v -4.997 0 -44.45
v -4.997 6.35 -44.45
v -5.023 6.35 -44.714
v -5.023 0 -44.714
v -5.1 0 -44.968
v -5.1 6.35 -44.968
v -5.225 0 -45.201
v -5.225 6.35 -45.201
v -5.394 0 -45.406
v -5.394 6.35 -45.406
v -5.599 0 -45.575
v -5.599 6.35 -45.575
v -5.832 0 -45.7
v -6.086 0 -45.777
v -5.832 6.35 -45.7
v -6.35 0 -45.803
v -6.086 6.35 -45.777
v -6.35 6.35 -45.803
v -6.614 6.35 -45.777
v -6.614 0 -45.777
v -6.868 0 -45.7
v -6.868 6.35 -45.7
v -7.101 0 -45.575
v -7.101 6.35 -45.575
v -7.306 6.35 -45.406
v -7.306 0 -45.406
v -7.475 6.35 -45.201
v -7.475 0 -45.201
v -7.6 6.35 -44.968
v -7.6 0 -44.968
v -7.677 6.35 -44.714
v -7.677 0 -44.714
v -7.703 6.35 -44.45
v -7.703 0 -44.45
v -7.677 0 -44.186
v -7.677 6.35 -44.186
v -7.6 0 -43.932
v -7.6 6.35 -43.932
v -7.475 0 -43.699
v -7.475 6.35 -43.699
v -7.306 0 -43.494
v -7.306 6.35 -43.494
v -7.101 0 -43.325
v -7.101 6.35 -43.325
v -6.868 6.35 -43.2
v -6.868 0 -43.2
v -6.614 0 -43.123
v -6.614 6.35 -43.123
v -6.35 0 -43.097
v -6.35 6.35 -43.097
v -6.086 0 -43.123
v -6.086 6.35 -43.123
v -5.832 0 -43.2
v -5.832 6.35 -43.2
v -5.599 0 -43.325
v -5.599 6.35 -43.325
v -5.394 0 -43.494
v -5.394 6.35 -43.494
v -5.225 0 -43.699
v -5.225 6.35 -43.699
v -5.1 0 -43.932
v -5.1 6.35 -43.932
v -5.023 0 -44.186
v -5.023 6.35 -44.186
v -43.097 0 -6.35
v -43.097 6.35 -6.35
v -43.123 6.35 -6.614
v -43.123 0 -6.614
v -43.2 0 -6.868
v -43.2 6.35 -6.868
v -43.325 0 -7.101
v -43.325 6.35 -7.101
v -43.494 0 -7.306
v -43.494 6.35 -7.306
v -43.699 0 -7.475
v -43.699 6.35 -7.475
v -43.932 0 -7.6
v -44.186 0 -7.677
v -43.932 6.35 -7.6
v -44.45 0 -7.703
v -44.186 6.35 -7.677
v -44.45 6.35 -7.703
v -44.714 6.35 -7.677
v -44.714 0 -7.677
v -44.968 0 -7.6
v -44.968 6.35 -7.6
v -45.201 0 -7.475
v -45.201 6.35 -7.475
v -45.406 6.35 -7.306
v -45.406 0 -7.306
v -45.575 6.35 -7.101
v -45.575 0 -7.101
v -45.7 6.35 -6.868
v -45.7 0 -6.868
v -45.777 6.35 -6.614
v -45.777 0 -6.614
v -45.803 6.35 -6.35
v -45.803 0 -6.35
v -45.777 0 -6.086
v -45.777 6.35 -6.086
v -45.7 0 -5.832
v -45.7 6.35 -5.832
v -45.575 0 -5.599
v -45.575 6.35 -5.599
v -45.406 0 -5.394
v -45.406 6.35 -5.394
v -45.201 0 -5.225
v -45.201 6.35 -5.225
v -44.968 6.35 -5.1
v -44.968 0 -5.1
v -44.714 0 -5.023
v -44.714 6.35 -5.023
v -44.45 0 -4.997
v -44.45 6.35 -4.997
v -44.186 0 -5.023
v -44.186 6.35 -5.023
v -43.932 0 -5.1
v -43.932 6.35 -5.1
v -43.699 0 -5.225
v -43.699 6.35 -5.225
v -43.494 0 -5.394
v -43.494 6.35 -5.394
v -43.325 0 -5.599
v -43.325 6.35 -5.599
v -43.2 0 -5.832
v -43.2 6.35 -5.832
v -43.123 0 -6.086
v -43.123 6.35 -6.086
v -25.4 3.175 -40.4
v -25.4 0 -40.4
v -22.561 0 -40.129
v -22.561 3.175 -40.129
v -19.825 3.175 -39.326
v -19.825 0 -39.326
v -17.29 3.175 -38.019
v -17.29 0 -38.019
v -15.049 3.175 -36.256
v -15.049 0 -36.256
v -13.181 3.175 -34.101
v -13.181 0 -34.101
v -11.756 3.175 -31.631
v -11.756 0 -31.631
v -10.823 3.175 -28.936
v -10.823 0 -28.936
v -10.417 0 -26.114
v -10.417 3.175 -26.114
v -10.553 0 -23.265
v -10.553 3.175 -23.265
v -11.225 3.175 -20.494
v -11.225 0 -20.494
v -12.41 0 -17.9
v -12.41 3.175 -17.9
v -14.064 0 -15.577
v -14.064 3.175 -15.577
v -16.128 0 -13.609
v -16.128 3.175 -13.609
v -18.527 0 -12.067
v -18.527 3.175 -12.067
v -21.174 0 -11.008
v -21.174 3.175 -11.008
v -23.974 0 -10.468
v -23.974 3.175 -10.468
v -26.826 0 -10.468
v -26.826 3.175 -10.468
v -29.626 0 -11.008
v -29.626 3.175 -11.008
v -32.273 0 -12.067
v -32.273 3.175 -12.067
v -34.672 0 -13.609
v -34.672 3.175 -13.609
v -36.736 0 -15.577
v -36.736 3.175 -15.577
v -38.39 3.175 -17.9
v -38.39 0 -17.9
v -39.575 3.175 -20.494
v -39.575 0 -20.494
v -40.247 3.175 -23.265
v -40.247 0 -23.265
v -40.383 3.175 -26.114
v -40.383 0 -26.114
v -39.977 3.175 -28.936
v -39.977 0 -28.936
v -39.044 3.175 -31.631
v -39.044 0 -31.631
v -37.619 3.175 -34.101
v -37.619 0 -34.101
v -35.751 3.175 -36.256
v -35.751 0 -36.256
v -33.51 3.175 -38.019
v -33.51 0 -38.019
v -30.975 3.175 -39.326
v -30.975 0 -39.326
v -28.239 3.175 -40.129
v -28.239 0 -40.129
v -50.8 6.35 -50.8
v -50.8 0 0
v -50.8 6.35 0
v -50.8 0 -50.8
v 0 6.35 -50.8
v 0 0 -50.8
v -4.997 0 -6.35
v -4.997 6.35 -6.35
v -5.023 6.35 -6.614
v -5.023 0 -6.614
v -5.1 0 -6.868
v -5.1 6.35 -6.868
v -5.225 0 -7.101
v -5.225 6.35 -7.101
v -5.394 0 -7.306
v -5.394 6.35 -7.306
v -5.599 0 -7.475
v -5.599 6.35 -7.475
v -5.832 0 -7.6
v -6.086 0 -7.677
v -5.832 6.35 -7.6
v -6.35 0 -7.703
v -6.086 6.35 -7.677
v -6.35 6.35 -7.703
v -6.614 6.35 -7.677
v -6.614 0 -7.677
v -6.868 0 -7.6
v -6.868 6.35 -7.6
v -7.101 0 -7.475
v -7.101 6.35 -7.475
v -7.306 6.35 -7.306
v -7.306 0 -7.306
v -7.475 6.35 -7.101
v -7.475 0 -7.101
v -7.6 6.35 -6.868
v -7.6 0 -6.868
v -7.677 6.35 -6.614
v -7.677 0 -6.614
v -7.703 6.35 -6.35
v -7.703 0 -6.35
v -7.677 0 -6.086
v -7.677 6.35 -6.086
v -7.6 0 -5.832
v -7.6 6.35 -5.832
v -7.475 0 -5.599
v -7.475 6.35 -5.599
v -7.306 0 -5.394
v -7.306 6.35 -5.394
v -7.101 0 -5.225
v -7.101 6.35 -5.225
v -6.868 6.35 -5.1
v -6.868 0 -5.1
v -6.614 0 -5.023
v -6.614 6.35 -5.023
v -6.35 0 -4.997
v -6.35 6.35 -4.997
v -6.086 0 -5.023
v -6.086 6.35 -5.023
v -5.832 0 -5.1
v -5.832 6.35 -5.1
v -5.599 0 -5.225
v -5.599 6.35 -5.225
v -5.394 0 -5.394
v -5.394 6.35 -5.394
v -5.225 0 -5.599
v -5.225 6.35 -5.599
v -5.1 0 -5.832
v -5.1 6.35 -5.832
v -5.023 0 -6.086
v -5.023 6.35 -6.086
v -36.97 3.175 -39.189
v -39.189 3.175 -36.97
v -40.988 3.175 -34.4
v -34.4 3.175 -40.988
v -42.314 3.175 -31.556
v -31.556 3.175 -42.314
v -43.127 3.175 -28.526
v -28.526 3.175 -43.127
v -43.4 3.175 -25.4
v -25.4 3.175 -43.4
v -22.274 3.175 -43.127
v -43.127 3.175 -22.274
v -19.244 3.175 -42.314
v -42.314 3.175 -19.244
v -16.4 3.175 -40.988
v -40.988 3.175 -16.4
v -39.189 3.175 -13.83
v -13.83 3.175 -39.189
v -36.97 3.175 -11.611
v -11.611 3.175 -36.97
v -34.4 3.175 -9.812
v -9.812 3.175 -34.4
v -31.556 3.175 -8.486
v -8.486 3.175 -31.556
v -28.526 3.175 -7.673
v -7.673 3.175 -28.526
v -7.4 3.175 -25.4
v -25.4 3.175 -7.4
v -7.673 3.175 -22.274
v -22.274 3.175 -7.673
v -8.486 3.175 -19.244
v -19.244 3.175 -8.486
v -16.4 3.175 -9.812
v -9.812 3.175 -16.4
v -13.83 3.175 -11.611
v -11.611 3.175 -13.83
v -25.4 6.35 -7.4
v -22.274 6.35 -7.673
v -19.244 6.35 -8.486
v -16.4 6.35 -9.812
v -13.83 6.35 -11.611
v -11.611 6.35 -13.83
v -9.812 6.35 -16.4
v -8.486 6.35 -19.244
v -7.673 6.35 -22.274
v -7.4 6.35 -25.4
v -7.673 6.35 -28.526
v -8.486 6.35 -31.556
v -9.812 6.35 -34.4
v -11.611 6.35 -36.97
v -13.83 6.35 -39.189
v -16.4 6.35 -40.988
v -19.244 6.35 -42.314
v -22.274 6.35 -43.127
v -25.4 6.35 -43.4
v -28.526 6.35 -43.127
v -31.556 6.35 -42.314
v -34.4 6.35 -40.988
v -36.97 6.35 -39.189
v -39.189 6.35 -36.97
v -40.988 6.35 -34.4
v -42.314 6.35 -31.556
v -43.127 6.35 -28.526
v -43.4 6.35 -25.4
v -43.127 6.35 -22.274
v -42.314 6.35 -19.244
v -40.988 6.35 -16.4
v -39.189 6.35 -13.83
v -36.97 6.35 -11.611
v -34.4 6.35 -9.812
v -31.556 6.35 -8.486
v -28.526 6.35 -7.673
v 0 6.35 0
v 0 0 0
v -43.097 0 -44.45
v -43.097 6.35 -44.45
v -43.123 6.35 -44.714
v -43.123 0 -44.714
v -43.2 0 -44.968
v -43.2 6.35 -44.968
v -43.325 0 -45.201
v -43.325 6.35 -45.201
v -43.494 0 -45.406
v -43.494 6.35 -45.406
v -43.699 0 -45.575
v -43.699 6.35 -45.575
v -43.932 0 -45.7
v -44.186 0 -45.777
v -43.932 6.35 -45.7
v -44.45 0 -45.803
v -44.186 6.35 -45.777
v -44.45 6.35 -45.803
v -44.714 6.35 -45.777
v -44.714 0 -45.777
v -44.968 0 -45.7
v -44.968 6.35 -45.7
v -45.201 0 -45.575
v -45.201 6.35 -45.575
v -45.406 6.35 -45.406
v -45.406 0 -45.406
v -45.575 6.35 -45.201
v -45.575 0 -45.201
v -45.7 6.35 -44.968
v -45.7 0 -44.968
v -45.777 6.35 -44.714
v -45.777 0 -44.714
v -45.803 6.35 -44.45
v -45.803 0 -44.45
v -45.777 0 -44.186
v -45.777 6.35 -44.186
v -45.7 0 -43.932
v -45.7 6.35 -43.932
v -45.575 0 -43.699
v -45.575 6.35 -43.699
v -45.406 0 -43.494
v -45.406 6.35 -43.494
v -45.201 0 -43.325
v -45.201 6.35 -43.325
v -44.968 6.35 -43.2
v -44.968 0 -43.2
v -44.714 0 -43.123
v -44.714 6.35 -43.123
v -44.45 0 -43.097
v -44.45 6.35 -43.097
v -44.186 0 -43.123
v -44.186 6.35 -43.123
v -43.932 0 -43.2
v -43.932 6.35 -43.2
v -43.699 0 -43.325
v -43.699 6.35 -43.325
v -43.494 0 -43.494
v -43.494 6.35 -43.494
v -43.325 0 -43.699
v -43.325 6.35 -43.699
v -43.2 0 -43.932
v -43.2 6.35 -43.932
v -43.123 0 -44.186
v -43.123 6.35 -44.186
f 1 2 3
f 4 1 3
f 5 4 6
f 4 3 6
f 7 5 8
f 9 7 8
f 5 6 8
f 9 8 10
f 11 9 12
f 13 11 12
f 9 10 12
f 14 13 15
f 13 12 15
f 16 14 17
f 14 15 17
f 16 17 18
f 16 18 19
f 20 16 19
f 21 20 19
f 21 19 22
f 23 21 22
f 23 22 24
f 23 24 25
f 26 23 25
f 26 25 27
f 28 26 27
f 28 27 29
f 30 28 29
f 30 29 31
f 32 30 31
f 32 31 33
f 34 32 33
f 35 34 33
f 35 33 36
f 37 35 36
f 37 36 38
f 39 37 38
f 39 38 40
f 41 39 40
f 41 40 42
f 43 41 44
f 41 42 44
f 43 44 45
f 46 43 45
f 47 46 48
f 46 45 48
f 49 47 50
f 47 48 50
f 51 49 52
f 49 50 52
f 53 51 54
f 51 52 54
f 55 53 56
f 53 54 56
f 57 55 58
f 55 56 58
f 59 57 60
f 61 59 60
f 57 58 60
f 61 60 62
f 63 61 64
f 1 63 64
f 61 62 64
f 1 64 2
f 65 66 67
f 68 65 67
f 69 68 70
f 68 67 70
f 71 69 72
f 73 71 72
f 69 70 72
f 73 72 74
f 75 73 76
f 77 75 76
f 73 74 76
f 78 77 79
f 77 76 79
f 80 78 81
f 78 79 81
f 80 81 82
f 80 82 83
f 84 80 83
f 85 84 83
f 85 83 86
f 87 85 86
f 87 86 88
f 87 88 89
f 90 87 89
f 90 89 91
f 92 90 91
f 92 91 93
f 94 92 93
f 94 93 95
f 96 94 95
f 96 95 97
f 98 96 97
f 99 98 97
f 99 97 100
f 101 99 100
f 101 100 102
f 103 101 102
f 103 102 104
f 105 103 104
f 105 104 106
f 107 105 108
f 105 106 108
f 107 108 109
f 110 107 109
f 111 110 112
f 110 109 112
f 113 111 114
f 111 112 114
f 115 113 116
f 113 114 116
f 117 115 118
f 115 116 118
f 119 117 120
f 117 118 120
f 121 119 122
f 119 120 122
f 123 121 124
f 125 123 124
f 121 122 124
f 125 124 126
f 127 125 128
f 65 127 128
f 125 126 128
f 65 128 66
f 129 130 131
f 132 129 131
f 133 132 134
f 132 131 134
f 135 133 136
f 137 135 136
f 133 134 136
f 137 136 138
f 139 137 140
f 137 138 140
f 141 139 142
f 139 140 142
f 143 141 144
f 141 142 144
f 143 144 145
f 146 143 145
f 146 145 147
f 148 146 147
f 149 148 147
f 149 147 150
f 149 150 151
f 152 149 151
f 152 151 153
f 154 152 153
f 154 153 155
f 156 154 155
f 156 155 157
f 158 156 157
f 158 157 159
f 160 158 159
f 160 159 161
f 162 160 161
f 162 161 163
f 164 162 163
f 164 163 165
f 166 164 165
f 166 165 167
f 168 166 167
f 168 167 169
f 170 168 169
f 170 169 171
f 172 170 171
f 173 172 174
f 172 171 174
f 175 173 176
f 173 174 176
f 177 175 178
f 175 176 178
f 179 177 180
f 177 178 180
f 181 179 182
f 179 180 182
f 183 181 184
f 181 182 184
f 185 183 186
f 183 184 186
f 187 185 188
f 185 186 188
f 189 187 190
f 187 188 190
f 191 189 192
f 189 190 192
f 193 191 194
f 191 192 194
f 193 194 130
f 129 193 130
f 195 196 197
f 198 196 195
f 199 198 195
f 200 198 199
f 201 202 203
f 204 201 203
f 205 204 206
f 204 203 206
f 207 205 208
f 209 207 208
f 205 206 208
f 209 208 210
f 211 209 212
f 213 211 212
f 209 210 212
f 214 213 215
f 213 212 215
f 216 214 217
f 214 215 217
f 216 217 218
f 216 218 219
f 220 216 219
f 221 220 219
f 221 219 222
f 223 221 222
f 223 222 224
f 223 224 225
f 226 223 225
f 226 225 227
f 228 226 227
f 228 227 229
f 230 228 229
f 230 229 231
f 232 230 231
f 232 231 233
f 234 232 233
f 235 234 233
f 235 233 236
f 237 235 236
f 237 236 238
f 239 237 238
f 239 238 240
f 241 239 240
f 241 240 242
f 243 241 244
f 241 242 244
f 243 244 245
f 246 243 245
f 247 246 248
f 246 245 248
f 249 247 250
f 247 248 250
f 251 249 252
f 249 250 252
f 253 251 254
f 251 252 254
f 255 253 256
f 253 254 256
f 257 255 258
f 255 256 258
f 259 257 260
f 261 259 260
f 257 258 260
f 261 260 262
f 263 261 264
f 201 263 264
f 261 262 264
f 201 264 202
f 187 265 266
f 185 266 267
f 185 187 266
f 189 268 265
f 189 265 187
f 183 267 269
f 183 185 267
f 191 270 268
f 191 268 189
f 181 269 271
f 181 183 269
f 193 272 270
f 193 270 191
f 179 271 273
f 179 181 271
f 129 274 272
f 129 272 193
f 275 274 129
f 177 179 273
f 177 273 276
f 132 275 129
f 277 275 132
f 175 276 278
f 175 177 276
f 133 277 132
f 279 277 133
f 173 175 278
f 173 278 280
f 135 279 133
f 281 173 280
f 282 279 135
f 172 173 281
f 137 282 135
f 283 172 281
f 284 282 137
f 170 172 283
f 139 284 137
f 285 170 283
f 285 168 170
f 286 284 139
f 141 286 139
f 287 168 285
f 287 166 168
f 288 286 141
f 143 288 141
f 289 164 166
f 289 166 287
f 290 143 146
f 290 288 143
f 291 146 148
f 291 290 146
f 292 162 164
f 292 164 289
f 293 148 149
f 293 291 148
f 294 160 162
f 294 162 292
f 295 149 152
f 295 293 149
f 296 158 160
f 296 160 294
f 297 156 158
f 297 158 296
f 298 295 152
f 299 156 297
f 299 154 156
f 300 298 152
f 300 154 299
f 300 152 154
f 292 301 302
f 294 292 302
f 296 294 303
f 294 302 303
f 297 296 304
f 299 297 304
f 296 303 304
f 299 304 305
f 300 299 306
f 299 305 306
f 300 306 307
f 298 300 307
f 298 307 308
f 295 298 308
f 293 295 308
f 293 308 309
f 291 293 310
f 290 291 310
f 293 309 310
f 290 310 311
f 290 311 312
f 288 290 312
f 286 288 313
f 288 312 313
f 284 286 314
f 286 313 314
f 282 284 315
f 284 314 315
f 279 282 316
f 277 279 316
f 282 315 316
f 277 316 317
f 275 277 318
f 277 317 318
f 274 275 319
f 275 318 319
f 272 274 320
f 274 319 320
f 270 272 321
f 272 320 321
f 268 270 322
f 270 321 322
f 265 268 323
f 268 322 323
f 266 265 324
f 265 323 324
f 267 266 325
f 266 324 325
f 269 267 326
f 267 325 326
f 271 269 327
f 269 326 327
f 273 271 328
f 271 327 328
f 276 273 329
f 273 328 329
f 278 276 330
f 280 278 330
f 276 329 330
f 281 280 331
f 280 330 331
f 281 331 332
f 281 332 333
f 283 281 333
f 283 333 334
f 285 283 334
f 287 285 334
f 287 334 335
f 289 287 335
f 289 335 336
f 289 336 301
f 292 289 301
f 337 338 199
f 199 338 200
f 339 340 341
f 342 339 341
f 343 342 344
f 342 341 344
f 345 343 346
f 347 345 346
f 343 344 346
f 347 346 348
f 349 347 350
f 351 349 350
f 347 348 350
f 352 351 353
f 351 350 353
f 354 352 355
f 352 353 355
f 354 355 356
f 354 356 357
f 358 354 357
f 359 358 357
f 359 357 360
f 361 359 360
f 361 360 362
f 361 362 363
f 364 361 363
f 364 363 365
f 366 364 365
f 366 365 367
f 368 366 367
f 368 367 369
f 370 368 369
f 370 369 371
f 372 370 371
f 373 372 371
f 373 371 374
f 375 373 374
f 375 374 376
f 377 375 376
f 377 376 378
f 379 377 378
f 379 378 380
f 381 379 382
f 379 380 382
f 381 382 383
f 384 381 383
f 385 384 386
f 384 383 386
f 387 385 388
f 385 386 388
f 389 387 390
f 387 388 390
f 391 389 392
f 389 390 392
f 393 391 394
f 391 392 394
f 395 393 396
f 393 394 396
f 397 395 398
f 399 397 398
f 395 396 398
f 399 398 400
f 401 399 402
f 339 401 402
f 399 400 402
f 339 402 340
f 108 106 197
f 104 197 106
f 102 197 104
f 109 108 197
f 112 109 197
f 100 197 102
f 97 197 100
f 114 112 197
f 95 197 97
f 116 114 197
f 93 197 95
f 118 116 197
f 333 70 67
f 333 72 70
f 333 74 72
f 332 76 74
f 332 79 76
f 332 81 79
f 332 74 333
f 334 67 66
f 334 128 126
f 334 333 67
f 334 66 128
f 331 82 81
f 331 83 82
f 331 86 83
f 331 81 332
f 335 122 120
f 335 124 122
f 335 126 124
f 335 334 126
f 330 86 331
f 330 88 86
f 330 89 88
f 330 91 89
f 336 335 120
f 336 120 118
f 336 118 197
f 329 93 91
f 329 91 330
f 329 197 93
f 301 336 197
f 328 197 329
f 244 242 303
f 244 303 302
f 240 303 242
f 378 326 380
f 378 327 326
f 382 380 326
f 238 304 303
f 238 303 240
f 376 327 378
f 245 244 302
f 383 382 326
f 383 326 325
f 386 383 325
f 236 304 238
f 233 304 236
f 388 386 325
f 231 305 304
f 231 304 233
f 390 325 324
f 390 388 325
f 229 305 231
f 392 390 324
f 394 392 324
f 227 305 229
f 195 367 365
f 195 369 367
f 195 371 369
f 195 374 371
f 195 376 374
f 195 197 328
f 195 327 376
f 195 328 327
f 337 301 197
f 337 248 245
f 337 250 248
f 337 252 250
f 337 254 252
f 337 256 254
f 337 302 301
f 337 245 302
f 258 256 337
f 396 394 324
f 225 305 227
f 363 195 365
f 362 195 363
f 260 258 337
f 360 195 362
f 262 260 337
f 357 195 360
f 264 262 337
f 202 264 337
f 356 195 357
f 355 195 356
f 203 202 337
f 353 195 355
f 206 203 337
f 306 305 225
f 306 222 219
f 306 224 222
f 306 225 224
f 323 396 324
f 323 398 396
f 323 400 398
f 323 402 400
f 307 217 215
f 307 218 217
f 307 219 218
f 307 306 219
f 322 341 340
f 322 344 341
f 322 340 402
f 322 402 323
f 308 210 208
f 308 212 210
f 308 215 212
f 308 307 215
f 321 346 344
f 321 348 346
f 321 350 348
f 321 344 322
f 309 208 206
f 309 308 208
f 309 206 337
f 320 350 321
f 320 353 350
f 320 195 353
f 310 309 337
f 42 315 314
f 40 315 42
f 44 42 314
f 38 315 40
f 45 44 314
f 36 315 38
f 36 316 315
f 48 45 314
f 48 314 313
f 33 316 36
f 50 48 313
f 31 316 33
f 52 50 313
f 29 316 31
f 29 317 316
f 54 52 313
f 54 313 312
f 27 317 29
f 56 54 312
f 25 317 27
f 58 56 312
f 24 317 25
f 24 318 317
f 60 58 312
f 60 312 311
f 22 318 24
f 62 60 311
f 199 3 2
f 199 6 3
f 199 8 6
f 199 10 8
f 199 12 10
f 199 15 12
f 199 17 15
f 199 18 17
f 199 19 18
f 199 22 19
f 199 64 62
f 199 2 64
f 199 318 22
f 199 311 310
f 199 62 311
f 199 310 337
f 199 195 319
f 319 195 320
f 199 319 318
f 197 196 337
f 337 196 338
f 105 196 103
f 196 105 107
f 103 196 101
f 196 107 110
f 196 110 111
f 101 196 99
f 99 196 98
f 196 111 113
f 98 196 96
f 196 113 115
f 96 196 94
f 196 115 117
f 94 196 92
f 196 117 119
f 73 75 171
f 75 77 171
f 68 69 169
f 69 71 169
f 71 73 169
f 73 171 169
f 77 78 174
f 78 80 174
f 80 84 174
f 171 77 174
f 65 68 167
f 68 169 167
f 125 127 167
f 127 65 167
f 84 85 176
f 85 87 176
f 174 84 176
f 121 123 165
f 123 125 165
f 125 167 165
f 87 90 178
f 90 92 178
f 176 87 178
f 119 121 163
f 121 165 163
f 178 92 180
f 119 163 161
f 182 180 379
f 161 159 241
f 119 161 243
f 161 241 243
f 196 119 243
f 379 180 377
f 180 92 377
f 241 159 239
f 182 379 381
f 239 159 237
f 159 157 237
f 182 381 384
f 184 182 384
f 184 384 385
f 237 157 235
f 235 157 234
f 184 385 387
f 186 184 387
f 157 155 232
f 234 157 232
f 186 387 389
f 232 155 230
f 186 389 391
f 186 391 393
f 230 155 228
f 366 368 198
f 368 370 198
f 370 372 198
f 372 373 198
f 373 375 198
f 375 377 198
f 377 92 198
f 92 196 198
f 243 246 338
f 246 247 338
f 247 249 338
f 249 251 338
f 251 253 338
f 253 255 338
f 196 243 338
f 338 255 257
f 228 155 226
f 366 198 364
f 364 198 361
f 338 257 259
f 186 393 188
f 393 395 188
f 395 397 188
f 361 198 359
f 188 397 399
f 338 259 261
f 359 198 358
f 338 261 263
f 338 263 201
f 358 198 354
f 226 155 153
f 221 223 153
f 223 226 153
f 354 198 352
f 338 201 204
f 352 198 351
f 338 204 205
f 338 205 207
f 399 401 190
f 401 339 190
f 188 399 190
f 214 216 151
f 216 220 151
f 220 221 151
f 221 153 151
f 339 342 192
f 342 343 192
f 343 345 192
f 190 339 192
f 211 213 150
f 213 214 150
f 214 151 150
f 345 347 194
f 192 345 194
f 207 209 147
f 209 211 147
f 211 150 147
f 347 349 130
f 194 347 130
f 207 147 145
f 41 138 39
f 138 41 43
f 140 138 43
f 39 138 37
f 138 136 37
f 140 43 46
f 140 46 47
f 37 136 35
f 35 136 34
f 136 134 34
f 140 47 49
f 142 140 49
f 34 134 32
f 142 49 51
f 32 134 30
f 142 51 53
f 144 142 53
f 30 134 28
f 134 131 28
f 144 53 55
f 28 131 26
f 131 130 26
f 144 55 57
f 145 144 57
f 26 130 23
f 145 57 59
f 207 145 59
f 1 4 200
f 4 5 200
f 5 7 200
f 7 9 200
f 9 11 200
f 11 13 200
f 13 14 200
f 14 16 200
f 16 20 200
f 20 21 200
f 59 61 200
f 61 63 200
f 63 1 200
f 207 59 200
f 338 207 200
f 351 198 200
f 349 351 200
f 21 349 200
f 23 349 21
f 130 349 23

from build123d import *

# Parameters (mm, degrees)
SKETCH2_W                 = 50.8
SKETCH2_H                 = 50.8
BOSS_EXTRUDE1_DEPTH       = 6.35
SKETCH3_R                 = 18
CUT_EXTRUDE1_DEPTH        = 3.175
SKETCH4_R                 = 15
CUT_EXTRUDE2_DEPTH        = 73.122135992
TAP_DRILL_FOR_6_32_TAP1_D = 2.7051


with BuildPart() as part:
    # Sketch2 → Boss-Extrude1 (new body)
    with BuildSketch(Plane(origin=(0, 0, 0), x_dir=(1, 0, 0), z_dir=(0, 1, 0))):
        with Locations((-25.4, 25.4)):
            Rectangle(SKETCH2_W, SKETCH2_H)
    extrude(amount=BOSS_EXTRUDE1_DEPTH)

    # Sketch3 → Cut-Extrude1 (cut)
    with BuildSketch(Plane(origin=(0, 6.35, 0), x_dir=(1, 0, 0), z_dir=(0, 1, 0))):
        with Locations(Location((-25.4, 25.4, 0), (0, 0, 270))):
            Circle(SKETCH3_R)
    extrude(amount=-CUT_EXTRUDE1_DEPTH, mode=Mode.SUBTRACT)

    # Sketch4 → Cut-Extrude2 (cut, through all)
    with BuildSketch(Plane(origin=(0, 0, 0), x_dir=(-1, 0, 0), z_dir=(0, -1, 0))):
        with Locations(Location((25.4, 25.4, 0), (0, 0, 90))):
            Circle(SKETCH4_R)
    extrude(amount=-CUT_EXTRUDE2_DEPTH, mode=Mode.SUBTRACT)

    # Tap Drill for #6-32 Tap1 (through all)
    with Locations(Plane(origin=(0, 0, 0), x_dir=(-1, 0, 0), z_dir=(0, -1, 0))):
        with Locations((6.35, 6.35), (6.35, 44.45), (44.45, 44.45), (44.45, 6.35), (25.4, 25.4)):
            Hole(TAP_DRILL_FOR_6_32_TAP1_D / 2)


solid = part.part
